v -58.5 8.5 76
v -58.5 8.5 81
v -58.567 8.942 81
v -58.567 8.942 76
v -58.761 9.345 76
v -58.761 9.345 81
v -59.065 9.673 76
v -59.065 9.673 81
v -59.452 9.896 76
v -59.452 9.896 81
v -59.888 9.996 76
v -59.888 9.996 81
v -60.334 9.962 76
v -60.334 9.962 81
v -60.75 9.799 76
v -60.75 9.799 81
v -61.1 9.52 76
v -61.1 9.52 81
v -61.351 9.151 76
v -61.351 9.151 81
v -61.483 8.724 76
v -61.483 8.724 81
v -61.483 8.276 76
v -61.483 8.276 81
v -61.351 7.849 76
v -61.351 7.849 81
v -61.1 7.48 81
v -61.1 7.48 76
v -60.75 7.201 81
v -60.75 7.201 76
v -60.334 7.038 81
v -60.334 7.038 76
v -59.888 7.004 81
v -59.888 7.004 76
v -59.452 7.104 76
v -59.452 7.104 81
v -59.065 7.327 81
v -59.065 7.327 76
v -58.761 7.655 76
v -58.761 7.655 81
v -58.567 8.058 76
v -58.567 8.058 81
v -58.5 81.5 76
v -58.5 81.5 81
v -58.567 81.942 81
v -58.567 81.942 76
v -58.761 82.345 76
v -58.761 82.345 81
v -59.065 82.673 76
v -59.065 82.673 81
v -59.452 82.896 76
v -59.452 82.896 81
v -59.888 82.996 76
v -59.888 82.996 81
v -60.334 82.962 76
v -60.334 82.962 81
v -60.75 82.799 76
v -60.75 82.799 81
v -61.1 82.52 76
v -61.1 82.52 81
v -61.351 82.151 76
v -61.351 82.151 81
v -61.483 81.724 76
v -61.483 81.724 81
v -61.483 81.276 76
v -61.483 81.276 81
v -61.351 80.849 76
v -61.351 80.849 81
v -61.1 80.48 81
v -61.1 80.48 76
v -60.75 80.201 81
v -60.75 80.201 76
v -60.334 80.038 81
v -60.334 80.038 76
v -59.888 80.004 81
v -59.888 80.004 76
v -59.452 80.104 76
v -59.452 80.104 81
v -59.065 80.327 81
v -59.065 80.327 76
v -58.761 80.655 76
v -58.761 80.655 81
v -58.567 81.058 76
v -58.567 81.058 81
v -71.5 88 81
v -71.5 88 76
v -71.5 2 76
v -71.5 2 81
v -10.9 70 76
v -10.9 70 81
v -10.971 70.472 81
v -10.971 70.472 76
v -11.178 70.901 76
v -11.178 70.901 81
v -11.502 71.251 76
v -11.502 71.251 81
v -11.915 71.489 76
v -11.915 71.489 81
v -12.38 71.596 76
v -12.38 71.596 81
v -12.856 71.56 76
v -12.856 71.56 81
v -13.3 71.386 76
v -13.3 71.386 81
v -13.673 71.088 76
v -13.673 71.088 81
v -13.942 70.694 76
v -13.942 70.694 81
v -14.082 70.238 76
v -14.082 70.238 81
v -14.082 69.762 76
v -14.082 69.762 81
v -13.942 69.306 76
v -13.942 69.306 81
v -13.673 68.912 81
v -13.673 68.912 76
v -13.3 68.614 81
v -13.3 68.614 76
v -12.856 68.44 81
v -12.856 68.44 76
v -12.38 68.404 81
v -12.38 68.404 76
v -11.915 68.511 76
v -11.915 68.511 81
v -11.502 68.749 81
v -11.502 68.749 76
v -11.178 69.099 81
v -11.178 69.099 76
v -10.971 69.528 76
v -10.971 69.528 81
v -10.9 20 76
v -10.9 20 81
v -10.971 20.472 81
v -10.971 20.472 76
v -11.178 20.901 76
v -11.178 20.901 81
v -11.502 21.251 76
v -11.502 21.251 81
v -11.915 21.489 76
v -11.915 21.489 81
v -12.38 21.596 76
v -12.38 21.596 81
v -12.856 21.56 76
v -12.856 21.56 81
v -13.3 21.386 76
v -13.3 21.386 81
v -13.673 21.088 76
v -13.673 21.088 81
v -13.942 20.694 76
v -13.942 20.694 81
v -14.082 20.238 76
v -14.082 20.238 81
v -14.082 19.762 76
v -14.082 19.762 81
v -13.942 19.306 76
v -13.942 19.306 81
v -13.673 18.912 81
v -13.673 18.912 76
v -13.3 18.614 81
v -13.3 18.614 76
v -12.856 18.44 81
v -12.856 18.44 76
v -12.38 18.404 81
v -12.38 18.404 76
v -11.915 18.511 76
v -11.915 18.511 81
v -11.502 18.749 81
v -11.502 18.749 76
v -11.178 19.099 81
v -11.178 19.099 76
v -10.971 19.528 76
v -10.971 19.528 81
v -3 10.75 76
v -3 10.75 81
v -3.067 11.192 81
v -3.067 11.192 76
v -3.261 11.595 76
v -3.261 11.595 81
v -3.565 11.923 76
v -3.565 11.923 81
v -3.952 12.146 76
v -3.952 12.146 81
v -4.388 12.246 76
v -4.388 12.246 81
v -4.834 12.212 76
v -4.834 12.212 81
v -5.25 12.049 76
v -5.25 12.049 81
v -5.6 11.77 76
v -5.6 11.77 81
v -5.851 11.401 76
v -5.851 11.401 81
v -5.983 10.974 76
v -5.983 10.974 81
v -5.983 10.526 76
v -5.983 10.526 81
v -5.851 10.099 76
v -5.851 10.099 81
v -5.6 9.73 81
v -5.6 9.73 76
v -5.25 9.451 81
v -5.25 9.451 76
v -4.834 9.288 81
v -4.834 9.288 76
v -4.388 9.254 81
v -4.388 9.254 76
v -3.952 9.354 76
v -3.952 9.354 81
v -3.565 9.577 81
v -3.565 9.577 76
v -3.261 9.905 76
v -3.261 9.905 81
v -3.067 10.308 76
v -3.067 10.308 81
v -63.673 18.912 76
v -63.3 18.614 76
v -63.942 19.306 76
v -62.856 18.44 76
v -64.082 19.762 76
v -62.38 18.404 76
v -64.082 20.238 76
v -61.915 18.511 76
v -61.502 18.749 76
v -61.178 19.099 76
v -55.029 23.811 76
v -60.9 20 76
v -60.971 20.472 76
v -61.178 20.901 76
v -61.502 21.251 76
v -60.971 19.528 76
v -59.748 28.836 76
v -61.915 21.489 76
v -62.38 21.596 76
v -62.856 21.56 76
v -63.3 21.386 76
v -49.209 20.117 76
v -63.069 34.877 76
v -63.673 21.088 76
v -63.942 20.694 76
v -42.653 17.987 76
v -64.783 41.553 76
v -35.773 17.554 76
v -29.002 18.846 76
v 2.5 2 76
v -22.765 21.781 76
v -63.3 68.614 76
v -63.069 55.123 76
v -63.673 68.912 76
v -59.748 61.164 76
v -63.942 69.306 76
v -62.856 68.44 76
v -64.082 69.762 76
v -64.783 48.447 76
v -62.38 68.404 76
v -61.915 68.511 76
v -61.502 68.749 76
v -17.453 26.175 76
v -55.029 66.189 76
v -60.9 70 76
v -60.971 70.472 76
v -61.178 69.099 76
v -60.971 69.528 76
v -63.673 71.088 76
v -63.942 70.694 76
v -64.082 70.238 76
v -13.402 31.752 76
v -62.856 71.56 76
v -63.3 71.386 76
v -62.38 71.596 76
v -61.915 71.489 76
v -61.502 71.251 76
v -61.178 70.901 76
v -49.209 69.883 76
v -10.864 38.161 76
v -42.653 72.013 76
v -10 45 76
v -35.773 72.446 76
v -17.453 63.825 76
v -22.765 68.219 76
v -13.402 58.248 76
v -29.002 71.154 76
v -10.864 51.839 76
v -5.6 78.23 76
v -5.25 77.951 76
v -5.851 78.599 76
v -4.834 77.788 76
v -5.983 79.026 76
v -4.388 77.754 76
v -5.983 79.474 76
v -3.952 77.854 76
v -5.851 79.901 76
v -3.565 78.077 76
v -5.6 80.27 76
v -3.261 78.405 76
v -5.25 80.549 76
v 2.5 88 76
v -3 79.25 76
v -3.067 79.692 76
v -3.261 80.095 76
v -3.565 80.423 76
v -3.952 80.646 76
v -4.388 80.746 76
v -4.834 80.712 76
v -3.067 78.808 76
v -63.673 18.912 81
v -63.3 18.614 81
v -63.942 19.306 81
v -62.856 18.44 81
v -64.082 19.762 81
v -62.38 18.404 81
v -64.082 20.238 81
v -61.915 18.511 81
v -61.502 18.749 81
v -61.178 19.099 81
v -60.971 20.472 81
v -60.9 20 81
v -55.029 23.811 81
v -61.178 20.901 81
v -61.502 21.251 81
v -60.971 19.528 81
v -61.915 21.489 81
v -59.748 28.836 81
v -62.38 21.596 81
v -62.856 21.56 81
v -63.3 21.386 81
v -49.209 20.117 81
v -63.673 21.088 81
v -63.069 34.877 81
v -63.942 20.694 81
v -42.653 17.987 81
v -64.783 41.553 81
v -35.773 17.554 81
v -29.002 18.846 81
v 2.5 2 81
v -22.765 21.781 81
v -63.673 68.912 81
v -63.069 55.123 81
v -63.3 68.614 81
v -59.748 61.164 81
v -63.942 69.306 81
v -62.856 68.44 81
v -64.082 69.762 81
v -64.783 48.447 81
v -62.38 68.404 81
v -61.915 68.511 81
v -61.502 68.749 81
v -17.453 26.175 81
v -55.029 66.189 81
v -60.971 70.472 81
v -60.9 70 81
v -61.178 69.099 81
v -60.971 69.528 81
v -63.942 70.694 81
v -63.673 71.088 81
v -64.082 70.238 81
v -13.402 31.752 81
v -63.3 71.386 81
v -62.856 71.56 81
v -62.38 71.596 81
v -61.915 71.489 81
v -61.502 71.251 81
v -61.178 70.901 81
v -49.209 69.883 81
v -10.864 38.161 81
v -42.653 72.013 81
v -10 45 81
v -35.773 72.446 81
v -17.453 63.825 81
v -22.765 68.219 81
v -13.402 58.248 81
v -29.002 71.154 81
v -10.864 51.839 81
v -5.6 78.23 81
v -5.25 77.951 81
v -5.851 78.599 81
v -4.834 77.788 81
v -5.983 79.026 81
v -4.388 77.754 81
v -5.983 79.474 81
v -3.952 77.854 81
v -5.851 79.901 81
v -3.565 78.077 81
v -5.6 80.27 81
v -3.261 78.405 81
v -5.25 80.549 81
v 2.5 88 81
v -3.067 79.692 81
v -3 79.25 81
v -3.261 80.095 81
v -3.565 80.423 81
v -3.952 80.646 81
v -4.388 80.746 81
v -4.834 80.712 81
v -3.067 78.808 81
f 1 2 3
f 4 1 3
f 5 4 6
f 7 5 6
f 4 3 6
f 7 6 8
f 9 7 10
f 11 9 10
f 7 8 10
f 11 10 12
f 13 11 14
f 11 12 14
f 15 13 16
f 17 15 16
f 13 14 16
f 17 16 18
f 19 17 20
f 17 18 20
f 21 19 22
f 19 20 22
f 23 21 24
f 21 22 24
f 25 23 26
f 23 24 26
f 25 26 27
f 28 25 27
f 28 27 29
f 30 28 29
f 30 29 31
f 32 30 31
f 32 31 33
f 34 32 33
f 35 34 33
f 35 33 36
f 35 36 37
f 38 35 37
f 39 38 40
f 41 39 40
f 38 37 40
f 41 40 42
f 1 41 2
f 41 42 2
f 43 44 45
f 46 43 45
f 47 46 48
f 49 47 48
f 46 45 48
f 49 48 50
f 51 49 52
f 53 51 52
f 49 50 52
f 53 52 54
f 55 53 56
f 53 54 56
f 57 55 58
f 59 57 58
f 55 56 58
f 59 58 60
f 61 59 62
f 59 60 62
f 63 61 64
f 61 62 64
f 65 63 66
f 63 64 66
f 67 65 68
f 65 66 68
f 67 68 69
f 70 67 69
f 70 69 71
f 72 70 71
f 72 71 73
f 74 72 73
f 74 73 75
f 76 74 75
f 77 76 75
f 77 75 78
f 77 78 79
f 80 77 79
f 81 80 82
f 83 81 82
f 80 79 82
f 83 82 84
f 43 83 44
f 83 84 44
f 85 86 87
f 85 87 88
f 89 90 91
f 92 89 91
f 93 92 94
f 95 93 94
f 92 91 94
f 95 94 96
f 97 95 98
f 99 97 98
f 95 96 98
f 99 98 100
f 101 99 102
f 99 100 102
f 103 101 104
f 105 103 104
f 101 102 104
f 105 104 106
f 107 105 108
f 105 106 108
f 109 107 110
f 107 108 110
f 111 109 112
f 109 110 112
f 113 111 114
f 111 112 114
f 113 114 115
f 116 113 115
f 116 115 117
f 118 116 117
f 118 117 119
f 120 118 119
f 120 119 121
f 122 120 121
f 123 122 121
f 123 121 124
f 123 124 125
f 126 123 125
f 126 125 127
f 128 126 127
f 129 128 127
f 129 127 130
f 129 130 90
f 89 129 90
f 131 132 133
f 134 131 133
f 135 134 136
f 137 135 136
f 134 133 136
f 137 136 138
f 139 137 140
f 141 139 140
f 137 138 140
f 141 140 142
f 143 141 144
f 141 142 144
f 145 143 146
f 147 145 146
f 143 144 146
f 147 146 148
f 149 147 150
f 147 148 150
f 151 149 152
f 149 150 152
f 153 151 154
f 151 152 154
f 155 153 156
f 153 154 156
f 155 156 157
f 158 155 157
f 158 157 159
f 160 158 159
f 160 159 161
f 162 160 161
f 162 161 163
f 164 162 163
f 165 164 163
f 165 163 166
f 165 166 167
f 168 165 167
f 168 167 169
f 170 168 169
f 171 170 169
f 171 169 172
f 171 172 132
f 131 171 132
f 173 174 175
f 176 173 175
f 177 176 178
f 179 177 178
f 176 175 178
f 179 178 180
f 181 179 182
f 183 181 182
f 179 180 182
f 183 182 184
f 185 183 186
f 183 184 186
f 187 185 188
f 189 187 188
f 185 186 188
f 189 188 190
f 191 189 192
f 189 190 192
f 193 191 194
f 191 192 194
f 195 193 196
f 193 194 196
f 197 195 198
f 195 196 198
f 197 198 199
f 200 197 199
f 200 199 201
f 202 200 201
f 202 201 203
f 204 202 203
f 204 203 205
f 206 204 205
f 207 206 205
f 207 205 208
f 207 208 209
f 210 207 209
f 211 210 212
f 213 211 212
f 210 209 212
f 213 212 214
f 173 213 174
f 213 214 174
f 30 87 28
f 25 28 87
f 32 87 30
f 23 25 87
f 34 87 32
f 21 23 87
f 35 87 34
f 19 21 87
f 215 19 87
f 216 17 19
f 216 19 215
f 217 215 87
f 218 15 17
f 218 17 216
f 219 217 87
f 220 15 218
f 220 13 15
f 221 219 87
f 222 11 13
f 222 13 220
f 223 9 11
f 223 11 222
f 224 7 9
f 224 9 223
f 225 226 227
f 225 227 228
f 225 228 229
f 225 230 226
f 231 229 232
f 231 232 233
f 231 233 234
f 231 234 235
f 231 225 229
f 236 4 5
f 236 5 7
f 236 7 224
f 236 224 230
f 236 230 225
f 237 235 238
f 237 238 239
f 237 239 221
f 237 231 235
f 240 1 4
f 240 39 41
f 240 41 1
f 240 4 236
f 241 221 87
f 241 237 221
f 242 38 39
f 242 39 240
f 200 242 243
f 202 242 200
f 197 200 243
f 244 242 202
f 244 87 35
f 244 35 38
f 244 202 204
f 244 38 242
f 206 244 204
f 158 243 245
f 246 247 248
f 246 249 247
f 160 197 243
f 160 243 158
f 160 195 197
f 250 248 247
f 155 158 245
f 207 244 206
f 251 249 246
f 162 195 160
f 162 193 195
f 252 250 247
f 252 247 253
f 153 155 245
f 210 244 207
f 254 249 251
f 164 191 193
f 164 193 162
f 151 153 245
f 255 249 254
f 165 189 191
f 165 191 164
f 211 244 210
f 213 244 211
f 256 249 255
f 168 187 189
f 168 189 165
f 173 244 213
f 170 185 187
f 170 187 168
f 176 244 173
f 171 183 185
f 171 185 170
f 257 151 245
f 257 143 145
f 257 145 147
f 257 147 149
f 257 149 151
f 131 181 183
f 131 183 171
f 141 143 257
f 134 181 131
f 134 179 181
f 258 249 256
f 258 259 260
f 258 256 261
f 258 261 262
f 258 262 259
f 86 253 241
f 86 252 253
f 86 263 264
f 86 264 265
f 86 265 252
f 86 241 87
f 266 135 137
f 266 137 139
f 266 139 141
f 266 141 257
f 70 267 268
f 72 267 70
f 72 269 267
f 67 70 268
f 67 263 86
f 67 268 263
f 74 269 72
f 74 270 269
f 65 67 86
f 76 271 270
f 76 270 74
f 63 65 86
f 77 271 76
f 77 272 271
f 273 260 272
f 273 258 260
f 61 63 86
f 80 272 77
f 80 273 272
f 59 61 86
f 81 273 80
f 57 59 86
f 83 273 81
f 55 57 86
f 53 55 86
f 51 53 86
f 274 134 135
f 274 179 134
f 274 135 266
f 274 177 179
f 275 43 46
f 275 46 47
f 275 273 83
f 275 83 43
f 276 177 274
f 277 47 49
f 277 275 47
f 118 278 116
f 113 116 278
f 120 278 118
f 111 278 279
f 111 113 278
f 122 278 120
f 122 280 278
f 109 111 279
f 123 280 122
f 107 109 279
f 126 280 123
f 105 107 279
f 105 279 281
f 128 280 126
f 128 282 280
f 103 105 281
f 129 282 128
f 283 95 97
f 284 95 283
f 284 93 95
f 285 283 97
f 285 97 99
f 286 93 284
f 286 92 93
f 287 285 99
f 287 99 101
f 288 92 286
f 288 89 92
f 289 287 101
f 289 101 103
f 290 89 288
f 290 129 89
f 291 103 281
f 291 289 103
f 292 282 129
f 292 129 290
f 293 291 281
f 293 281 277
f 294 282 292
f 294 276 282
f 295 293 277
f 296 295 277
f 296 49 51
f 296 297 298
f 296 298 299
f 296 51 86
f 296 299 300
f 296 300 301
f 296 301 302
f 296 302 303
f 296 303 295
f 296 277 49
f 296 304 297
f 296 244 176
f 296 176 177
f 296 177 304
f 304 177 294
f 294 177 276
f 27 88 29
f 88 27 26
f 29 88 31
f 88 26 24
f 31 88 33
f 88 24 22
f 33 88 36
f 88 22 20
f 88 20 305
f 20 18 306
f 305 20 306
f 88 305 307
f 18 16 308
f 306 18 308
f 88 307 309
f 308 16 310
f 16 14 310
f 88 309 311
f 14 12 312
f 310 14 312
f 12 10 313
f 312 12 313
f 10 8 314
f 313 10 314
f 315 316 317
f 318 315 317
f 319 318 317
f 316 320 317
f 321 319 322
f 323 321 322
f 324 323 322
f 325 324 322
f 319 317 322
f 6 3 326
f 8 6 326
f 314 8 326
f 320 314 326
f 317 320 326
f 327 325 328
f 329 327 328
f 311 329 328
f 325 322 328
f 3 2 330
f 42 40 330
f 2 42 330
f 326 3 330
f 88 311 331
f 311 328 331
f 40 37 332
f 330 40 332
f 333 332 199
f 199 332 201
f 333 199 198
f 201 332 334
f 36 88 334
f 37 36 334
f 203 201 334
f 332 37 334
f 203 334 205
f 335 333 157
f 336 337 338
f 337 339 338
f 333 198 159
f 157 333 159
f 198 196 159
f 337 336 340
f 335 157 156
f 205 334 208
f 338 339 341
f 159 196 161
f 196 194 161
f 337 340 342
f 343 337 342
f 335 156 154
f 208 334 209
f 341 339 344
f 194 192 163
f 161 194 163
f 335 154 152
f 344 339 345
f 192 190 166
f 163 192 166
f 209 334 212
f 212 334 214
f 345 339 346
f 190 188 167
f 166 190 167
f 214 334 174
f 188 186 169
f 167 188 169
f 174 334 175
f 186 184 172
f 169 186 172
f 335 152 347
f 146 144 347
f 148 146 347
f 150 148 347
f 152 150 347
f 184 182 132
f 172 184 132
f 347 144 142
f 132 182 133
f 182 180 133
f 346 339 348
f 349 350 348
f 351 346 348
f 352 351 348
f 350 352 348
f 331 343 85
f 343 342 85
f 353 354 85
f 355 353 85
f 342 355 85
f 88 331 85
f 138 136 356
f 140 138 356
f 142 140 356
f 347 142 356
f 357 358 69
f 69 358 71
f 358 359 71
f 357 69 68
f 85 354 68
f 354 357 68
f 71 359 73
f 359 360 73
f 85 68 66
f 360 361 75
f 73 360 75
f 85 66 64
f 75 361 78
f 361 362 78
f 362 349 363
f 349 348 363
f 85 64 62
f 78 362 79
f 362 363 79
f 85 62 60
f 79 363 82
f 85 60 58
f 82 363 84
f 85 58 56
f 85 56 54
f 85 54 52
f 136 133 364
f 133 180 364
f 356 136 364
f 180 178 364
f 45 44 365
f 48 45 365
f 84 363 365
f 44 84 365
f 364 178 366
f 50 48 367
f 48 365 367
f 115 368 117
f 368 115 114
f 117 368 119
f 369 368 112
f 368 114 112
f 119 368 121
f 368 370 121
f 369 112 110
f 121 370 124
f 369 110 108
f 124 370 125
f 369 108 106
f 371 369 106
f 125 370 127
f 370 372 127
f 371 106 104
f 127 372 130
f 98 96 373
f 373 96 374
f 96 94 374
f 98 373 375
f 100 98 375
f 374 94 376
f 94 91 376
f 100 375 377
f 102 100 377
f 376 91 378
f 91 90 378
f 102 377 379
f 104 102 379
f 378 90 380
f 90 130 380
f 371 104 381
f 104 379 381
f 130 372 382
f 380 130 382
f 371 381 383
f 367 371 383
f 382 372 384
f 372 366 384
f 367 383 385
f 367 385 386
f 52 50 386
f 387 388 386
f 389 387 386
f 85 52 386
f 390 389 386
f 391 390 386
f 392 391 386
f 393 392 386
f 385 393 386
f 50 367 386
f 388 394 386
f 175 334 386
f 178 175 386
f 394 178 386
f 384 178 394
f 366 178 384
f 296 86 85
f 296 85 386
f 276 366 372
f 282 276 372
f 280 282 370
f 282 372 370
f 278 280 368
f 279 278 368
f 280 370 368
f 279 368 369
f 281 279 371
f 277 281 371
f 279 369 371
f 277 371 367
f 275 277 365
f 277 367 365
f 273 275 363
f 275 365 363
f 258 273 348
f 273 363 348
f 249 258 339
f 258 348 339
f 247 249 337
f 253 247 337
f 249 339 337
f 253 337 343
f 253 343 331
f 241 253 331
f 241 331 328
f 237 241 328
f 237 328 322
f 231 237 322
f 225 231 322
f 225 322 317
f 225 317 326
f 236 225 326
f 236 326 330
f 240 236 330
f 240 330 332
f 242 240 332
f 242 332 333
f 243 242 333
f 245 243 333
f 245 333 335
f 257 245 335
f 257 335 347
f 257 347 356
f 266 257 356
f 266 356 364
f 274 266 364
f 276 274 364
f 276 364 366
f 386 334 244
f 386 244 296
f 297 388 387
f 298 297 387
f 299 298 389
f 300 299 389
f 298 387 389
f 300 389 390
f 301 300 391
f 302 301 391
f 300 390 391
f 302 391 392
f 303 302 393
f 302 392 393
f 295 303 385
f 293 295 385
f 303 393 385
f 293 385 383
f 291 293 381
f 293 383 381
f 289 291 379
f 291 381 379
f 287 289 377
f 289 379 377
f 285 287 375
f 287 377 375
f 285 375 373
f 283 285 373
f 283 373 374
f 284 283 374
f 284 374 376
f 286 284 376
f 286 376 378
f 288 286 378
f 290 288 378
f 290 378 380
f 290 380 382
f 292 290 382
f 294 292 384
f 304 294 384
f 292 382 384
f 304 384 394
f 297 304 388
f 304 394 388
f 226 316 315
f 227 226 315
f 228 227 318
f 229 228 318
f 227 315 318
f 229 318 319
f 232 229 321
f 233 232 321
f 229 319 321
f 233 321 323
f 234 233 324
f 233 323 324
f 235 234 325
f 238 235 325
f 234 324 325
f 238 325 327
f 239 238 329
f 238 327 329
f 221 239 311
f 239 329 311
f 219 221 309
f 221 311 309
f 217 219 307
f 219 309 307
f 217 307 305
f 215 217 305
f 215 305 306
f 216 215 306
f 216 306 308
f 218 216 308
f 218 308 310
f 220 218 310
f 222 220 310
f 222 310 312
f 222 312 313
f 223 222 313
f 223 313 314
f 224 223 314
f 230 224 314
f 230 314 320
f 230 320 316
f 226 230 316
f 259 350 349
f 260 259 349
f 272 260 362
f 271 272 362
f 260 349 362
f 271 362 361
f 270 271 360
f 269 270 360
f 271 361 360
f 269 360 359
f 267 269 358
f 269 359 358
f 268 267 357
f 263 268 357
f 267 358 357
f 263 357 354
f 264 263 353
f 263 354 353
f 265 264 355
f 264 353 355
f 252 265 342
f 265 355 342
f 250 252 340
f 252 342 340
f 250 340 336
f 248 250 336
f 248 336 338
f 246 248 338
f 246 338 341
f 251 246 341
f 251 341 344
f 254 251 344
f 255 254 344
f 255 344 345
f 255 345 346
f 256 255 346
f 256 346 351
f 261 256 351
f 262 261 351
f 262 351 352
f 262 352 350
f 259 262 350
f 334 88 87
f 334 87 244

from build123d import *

# Parameters (mm, degrees)
SKETCH_1_W          = 69.5
SKETCH_1_H          = 100
SKETCH_1_R          = 1.5
EXTRUDE_1_DEPTH     = 5
SKETCH_5_R          = 1.6
SKETCH_5_R_2        = 27.5
CUT_EXTRUDE_1_DEPTH = 6
SKETCH_6_W          = 5
SKETCH_6_H          = 100
EXTRUDE_2_DEPTH     = 4.5
SKETCH_7_W          = 74
SKETCH_7_H          = 5
CUT_EXTRUDE_2_DEPTH = 7
SKETCH_8_W          = 74
SKETCH_8_H          = 5
CUT_EXTRUDE_3_DEPTH = 7


with BuildPart() as part:
    # Эскиз1 → Бобышка-Вытянуть1 (new body)
    with BuildSketch(Plane.XY.offset(81)):
        with Locations((-32.25, 45)):
            Rectangle(SKETCH_1_W, SKETCH_1_H)
        with Locations((-60, 8.5)):
            Circle(SKETCH_1_R, mode=Mode.SUBTRACT)
        with Locations((-60, 81.5)):
            Circle(SKETCH_1_R, mode=Mode.SUBTRACT)
        with Locations((-4.5, 79.25)):
            Circle(SKETCH_1_R, mode=Mode.SUBTRACT)
        with Locations((-4.5, 10.75)):
            Circle(SKETCH_1_R, mode=Mode.SUBTRACT)
    extrude(amount=-EXTRUDE_1_DEPTH)

    # Эскиз5 → Вырез-Вытянуть1 (cut, through all)
    with BuildSketch(Plane.XY.offset(81)):
        with Locations((-12.5, 70)):
            Circle(SKETCH_5_R)
        with Locations((-12.5, 20)):
            Circle(SKETCH_5_R)
        with Locations((-62.5, 20)):
            Circle(SKETCH_5_R)
        with Locations((-62.5, 70)):
            Circle(SKETCH_5_R)
        with Locations((-37.5, 45)):
            Circle(SKETCH_5_R_2)
    extrude(amount=-CUT_EXTRUDE_1_DEPTH, mode=Mode.SUBTRACT)

    # Эскиз6 → Бобышка-Вытянуть2 (add)
    with BuildSketch(Plane.ZY.offset(67)):
        with Locations((78.5, 45)):
            Rectangle(SKETCH_6_W, SKETCH_6_H)
    extrude(amount=EXTRUDE_2_DEPTH)

    # Эскиз7 → Вырез-Вытянуть2 (cut)
    with BuildSketch(Plane(origin=(0, 95, 0), x_dir=(1, 0, 0), z_dir=(0, 1, 0))):
        with Locations((-34.5, -78.5)):
            Rectangle(SKETCH_7_W, SKETCH_7_H)
    extrude(amount=-CUT_EXTRUDE_2_DEPTH, mode=Mode.SUBTRACT)

    # Эскиз8 → Вырез-Вытянуть3 (cut)
    with BuildSketch(Plane.XZ.offset(5)):
        with Locations((-34.5, 78.5)):
            Rectangle(SKETCH_8_W, SKETCH_8_H)
    extrude(amount=-CUT_EXTRUDE_3_DEPTH, mode=Mode.SUBTRACT)


solid = part.part
